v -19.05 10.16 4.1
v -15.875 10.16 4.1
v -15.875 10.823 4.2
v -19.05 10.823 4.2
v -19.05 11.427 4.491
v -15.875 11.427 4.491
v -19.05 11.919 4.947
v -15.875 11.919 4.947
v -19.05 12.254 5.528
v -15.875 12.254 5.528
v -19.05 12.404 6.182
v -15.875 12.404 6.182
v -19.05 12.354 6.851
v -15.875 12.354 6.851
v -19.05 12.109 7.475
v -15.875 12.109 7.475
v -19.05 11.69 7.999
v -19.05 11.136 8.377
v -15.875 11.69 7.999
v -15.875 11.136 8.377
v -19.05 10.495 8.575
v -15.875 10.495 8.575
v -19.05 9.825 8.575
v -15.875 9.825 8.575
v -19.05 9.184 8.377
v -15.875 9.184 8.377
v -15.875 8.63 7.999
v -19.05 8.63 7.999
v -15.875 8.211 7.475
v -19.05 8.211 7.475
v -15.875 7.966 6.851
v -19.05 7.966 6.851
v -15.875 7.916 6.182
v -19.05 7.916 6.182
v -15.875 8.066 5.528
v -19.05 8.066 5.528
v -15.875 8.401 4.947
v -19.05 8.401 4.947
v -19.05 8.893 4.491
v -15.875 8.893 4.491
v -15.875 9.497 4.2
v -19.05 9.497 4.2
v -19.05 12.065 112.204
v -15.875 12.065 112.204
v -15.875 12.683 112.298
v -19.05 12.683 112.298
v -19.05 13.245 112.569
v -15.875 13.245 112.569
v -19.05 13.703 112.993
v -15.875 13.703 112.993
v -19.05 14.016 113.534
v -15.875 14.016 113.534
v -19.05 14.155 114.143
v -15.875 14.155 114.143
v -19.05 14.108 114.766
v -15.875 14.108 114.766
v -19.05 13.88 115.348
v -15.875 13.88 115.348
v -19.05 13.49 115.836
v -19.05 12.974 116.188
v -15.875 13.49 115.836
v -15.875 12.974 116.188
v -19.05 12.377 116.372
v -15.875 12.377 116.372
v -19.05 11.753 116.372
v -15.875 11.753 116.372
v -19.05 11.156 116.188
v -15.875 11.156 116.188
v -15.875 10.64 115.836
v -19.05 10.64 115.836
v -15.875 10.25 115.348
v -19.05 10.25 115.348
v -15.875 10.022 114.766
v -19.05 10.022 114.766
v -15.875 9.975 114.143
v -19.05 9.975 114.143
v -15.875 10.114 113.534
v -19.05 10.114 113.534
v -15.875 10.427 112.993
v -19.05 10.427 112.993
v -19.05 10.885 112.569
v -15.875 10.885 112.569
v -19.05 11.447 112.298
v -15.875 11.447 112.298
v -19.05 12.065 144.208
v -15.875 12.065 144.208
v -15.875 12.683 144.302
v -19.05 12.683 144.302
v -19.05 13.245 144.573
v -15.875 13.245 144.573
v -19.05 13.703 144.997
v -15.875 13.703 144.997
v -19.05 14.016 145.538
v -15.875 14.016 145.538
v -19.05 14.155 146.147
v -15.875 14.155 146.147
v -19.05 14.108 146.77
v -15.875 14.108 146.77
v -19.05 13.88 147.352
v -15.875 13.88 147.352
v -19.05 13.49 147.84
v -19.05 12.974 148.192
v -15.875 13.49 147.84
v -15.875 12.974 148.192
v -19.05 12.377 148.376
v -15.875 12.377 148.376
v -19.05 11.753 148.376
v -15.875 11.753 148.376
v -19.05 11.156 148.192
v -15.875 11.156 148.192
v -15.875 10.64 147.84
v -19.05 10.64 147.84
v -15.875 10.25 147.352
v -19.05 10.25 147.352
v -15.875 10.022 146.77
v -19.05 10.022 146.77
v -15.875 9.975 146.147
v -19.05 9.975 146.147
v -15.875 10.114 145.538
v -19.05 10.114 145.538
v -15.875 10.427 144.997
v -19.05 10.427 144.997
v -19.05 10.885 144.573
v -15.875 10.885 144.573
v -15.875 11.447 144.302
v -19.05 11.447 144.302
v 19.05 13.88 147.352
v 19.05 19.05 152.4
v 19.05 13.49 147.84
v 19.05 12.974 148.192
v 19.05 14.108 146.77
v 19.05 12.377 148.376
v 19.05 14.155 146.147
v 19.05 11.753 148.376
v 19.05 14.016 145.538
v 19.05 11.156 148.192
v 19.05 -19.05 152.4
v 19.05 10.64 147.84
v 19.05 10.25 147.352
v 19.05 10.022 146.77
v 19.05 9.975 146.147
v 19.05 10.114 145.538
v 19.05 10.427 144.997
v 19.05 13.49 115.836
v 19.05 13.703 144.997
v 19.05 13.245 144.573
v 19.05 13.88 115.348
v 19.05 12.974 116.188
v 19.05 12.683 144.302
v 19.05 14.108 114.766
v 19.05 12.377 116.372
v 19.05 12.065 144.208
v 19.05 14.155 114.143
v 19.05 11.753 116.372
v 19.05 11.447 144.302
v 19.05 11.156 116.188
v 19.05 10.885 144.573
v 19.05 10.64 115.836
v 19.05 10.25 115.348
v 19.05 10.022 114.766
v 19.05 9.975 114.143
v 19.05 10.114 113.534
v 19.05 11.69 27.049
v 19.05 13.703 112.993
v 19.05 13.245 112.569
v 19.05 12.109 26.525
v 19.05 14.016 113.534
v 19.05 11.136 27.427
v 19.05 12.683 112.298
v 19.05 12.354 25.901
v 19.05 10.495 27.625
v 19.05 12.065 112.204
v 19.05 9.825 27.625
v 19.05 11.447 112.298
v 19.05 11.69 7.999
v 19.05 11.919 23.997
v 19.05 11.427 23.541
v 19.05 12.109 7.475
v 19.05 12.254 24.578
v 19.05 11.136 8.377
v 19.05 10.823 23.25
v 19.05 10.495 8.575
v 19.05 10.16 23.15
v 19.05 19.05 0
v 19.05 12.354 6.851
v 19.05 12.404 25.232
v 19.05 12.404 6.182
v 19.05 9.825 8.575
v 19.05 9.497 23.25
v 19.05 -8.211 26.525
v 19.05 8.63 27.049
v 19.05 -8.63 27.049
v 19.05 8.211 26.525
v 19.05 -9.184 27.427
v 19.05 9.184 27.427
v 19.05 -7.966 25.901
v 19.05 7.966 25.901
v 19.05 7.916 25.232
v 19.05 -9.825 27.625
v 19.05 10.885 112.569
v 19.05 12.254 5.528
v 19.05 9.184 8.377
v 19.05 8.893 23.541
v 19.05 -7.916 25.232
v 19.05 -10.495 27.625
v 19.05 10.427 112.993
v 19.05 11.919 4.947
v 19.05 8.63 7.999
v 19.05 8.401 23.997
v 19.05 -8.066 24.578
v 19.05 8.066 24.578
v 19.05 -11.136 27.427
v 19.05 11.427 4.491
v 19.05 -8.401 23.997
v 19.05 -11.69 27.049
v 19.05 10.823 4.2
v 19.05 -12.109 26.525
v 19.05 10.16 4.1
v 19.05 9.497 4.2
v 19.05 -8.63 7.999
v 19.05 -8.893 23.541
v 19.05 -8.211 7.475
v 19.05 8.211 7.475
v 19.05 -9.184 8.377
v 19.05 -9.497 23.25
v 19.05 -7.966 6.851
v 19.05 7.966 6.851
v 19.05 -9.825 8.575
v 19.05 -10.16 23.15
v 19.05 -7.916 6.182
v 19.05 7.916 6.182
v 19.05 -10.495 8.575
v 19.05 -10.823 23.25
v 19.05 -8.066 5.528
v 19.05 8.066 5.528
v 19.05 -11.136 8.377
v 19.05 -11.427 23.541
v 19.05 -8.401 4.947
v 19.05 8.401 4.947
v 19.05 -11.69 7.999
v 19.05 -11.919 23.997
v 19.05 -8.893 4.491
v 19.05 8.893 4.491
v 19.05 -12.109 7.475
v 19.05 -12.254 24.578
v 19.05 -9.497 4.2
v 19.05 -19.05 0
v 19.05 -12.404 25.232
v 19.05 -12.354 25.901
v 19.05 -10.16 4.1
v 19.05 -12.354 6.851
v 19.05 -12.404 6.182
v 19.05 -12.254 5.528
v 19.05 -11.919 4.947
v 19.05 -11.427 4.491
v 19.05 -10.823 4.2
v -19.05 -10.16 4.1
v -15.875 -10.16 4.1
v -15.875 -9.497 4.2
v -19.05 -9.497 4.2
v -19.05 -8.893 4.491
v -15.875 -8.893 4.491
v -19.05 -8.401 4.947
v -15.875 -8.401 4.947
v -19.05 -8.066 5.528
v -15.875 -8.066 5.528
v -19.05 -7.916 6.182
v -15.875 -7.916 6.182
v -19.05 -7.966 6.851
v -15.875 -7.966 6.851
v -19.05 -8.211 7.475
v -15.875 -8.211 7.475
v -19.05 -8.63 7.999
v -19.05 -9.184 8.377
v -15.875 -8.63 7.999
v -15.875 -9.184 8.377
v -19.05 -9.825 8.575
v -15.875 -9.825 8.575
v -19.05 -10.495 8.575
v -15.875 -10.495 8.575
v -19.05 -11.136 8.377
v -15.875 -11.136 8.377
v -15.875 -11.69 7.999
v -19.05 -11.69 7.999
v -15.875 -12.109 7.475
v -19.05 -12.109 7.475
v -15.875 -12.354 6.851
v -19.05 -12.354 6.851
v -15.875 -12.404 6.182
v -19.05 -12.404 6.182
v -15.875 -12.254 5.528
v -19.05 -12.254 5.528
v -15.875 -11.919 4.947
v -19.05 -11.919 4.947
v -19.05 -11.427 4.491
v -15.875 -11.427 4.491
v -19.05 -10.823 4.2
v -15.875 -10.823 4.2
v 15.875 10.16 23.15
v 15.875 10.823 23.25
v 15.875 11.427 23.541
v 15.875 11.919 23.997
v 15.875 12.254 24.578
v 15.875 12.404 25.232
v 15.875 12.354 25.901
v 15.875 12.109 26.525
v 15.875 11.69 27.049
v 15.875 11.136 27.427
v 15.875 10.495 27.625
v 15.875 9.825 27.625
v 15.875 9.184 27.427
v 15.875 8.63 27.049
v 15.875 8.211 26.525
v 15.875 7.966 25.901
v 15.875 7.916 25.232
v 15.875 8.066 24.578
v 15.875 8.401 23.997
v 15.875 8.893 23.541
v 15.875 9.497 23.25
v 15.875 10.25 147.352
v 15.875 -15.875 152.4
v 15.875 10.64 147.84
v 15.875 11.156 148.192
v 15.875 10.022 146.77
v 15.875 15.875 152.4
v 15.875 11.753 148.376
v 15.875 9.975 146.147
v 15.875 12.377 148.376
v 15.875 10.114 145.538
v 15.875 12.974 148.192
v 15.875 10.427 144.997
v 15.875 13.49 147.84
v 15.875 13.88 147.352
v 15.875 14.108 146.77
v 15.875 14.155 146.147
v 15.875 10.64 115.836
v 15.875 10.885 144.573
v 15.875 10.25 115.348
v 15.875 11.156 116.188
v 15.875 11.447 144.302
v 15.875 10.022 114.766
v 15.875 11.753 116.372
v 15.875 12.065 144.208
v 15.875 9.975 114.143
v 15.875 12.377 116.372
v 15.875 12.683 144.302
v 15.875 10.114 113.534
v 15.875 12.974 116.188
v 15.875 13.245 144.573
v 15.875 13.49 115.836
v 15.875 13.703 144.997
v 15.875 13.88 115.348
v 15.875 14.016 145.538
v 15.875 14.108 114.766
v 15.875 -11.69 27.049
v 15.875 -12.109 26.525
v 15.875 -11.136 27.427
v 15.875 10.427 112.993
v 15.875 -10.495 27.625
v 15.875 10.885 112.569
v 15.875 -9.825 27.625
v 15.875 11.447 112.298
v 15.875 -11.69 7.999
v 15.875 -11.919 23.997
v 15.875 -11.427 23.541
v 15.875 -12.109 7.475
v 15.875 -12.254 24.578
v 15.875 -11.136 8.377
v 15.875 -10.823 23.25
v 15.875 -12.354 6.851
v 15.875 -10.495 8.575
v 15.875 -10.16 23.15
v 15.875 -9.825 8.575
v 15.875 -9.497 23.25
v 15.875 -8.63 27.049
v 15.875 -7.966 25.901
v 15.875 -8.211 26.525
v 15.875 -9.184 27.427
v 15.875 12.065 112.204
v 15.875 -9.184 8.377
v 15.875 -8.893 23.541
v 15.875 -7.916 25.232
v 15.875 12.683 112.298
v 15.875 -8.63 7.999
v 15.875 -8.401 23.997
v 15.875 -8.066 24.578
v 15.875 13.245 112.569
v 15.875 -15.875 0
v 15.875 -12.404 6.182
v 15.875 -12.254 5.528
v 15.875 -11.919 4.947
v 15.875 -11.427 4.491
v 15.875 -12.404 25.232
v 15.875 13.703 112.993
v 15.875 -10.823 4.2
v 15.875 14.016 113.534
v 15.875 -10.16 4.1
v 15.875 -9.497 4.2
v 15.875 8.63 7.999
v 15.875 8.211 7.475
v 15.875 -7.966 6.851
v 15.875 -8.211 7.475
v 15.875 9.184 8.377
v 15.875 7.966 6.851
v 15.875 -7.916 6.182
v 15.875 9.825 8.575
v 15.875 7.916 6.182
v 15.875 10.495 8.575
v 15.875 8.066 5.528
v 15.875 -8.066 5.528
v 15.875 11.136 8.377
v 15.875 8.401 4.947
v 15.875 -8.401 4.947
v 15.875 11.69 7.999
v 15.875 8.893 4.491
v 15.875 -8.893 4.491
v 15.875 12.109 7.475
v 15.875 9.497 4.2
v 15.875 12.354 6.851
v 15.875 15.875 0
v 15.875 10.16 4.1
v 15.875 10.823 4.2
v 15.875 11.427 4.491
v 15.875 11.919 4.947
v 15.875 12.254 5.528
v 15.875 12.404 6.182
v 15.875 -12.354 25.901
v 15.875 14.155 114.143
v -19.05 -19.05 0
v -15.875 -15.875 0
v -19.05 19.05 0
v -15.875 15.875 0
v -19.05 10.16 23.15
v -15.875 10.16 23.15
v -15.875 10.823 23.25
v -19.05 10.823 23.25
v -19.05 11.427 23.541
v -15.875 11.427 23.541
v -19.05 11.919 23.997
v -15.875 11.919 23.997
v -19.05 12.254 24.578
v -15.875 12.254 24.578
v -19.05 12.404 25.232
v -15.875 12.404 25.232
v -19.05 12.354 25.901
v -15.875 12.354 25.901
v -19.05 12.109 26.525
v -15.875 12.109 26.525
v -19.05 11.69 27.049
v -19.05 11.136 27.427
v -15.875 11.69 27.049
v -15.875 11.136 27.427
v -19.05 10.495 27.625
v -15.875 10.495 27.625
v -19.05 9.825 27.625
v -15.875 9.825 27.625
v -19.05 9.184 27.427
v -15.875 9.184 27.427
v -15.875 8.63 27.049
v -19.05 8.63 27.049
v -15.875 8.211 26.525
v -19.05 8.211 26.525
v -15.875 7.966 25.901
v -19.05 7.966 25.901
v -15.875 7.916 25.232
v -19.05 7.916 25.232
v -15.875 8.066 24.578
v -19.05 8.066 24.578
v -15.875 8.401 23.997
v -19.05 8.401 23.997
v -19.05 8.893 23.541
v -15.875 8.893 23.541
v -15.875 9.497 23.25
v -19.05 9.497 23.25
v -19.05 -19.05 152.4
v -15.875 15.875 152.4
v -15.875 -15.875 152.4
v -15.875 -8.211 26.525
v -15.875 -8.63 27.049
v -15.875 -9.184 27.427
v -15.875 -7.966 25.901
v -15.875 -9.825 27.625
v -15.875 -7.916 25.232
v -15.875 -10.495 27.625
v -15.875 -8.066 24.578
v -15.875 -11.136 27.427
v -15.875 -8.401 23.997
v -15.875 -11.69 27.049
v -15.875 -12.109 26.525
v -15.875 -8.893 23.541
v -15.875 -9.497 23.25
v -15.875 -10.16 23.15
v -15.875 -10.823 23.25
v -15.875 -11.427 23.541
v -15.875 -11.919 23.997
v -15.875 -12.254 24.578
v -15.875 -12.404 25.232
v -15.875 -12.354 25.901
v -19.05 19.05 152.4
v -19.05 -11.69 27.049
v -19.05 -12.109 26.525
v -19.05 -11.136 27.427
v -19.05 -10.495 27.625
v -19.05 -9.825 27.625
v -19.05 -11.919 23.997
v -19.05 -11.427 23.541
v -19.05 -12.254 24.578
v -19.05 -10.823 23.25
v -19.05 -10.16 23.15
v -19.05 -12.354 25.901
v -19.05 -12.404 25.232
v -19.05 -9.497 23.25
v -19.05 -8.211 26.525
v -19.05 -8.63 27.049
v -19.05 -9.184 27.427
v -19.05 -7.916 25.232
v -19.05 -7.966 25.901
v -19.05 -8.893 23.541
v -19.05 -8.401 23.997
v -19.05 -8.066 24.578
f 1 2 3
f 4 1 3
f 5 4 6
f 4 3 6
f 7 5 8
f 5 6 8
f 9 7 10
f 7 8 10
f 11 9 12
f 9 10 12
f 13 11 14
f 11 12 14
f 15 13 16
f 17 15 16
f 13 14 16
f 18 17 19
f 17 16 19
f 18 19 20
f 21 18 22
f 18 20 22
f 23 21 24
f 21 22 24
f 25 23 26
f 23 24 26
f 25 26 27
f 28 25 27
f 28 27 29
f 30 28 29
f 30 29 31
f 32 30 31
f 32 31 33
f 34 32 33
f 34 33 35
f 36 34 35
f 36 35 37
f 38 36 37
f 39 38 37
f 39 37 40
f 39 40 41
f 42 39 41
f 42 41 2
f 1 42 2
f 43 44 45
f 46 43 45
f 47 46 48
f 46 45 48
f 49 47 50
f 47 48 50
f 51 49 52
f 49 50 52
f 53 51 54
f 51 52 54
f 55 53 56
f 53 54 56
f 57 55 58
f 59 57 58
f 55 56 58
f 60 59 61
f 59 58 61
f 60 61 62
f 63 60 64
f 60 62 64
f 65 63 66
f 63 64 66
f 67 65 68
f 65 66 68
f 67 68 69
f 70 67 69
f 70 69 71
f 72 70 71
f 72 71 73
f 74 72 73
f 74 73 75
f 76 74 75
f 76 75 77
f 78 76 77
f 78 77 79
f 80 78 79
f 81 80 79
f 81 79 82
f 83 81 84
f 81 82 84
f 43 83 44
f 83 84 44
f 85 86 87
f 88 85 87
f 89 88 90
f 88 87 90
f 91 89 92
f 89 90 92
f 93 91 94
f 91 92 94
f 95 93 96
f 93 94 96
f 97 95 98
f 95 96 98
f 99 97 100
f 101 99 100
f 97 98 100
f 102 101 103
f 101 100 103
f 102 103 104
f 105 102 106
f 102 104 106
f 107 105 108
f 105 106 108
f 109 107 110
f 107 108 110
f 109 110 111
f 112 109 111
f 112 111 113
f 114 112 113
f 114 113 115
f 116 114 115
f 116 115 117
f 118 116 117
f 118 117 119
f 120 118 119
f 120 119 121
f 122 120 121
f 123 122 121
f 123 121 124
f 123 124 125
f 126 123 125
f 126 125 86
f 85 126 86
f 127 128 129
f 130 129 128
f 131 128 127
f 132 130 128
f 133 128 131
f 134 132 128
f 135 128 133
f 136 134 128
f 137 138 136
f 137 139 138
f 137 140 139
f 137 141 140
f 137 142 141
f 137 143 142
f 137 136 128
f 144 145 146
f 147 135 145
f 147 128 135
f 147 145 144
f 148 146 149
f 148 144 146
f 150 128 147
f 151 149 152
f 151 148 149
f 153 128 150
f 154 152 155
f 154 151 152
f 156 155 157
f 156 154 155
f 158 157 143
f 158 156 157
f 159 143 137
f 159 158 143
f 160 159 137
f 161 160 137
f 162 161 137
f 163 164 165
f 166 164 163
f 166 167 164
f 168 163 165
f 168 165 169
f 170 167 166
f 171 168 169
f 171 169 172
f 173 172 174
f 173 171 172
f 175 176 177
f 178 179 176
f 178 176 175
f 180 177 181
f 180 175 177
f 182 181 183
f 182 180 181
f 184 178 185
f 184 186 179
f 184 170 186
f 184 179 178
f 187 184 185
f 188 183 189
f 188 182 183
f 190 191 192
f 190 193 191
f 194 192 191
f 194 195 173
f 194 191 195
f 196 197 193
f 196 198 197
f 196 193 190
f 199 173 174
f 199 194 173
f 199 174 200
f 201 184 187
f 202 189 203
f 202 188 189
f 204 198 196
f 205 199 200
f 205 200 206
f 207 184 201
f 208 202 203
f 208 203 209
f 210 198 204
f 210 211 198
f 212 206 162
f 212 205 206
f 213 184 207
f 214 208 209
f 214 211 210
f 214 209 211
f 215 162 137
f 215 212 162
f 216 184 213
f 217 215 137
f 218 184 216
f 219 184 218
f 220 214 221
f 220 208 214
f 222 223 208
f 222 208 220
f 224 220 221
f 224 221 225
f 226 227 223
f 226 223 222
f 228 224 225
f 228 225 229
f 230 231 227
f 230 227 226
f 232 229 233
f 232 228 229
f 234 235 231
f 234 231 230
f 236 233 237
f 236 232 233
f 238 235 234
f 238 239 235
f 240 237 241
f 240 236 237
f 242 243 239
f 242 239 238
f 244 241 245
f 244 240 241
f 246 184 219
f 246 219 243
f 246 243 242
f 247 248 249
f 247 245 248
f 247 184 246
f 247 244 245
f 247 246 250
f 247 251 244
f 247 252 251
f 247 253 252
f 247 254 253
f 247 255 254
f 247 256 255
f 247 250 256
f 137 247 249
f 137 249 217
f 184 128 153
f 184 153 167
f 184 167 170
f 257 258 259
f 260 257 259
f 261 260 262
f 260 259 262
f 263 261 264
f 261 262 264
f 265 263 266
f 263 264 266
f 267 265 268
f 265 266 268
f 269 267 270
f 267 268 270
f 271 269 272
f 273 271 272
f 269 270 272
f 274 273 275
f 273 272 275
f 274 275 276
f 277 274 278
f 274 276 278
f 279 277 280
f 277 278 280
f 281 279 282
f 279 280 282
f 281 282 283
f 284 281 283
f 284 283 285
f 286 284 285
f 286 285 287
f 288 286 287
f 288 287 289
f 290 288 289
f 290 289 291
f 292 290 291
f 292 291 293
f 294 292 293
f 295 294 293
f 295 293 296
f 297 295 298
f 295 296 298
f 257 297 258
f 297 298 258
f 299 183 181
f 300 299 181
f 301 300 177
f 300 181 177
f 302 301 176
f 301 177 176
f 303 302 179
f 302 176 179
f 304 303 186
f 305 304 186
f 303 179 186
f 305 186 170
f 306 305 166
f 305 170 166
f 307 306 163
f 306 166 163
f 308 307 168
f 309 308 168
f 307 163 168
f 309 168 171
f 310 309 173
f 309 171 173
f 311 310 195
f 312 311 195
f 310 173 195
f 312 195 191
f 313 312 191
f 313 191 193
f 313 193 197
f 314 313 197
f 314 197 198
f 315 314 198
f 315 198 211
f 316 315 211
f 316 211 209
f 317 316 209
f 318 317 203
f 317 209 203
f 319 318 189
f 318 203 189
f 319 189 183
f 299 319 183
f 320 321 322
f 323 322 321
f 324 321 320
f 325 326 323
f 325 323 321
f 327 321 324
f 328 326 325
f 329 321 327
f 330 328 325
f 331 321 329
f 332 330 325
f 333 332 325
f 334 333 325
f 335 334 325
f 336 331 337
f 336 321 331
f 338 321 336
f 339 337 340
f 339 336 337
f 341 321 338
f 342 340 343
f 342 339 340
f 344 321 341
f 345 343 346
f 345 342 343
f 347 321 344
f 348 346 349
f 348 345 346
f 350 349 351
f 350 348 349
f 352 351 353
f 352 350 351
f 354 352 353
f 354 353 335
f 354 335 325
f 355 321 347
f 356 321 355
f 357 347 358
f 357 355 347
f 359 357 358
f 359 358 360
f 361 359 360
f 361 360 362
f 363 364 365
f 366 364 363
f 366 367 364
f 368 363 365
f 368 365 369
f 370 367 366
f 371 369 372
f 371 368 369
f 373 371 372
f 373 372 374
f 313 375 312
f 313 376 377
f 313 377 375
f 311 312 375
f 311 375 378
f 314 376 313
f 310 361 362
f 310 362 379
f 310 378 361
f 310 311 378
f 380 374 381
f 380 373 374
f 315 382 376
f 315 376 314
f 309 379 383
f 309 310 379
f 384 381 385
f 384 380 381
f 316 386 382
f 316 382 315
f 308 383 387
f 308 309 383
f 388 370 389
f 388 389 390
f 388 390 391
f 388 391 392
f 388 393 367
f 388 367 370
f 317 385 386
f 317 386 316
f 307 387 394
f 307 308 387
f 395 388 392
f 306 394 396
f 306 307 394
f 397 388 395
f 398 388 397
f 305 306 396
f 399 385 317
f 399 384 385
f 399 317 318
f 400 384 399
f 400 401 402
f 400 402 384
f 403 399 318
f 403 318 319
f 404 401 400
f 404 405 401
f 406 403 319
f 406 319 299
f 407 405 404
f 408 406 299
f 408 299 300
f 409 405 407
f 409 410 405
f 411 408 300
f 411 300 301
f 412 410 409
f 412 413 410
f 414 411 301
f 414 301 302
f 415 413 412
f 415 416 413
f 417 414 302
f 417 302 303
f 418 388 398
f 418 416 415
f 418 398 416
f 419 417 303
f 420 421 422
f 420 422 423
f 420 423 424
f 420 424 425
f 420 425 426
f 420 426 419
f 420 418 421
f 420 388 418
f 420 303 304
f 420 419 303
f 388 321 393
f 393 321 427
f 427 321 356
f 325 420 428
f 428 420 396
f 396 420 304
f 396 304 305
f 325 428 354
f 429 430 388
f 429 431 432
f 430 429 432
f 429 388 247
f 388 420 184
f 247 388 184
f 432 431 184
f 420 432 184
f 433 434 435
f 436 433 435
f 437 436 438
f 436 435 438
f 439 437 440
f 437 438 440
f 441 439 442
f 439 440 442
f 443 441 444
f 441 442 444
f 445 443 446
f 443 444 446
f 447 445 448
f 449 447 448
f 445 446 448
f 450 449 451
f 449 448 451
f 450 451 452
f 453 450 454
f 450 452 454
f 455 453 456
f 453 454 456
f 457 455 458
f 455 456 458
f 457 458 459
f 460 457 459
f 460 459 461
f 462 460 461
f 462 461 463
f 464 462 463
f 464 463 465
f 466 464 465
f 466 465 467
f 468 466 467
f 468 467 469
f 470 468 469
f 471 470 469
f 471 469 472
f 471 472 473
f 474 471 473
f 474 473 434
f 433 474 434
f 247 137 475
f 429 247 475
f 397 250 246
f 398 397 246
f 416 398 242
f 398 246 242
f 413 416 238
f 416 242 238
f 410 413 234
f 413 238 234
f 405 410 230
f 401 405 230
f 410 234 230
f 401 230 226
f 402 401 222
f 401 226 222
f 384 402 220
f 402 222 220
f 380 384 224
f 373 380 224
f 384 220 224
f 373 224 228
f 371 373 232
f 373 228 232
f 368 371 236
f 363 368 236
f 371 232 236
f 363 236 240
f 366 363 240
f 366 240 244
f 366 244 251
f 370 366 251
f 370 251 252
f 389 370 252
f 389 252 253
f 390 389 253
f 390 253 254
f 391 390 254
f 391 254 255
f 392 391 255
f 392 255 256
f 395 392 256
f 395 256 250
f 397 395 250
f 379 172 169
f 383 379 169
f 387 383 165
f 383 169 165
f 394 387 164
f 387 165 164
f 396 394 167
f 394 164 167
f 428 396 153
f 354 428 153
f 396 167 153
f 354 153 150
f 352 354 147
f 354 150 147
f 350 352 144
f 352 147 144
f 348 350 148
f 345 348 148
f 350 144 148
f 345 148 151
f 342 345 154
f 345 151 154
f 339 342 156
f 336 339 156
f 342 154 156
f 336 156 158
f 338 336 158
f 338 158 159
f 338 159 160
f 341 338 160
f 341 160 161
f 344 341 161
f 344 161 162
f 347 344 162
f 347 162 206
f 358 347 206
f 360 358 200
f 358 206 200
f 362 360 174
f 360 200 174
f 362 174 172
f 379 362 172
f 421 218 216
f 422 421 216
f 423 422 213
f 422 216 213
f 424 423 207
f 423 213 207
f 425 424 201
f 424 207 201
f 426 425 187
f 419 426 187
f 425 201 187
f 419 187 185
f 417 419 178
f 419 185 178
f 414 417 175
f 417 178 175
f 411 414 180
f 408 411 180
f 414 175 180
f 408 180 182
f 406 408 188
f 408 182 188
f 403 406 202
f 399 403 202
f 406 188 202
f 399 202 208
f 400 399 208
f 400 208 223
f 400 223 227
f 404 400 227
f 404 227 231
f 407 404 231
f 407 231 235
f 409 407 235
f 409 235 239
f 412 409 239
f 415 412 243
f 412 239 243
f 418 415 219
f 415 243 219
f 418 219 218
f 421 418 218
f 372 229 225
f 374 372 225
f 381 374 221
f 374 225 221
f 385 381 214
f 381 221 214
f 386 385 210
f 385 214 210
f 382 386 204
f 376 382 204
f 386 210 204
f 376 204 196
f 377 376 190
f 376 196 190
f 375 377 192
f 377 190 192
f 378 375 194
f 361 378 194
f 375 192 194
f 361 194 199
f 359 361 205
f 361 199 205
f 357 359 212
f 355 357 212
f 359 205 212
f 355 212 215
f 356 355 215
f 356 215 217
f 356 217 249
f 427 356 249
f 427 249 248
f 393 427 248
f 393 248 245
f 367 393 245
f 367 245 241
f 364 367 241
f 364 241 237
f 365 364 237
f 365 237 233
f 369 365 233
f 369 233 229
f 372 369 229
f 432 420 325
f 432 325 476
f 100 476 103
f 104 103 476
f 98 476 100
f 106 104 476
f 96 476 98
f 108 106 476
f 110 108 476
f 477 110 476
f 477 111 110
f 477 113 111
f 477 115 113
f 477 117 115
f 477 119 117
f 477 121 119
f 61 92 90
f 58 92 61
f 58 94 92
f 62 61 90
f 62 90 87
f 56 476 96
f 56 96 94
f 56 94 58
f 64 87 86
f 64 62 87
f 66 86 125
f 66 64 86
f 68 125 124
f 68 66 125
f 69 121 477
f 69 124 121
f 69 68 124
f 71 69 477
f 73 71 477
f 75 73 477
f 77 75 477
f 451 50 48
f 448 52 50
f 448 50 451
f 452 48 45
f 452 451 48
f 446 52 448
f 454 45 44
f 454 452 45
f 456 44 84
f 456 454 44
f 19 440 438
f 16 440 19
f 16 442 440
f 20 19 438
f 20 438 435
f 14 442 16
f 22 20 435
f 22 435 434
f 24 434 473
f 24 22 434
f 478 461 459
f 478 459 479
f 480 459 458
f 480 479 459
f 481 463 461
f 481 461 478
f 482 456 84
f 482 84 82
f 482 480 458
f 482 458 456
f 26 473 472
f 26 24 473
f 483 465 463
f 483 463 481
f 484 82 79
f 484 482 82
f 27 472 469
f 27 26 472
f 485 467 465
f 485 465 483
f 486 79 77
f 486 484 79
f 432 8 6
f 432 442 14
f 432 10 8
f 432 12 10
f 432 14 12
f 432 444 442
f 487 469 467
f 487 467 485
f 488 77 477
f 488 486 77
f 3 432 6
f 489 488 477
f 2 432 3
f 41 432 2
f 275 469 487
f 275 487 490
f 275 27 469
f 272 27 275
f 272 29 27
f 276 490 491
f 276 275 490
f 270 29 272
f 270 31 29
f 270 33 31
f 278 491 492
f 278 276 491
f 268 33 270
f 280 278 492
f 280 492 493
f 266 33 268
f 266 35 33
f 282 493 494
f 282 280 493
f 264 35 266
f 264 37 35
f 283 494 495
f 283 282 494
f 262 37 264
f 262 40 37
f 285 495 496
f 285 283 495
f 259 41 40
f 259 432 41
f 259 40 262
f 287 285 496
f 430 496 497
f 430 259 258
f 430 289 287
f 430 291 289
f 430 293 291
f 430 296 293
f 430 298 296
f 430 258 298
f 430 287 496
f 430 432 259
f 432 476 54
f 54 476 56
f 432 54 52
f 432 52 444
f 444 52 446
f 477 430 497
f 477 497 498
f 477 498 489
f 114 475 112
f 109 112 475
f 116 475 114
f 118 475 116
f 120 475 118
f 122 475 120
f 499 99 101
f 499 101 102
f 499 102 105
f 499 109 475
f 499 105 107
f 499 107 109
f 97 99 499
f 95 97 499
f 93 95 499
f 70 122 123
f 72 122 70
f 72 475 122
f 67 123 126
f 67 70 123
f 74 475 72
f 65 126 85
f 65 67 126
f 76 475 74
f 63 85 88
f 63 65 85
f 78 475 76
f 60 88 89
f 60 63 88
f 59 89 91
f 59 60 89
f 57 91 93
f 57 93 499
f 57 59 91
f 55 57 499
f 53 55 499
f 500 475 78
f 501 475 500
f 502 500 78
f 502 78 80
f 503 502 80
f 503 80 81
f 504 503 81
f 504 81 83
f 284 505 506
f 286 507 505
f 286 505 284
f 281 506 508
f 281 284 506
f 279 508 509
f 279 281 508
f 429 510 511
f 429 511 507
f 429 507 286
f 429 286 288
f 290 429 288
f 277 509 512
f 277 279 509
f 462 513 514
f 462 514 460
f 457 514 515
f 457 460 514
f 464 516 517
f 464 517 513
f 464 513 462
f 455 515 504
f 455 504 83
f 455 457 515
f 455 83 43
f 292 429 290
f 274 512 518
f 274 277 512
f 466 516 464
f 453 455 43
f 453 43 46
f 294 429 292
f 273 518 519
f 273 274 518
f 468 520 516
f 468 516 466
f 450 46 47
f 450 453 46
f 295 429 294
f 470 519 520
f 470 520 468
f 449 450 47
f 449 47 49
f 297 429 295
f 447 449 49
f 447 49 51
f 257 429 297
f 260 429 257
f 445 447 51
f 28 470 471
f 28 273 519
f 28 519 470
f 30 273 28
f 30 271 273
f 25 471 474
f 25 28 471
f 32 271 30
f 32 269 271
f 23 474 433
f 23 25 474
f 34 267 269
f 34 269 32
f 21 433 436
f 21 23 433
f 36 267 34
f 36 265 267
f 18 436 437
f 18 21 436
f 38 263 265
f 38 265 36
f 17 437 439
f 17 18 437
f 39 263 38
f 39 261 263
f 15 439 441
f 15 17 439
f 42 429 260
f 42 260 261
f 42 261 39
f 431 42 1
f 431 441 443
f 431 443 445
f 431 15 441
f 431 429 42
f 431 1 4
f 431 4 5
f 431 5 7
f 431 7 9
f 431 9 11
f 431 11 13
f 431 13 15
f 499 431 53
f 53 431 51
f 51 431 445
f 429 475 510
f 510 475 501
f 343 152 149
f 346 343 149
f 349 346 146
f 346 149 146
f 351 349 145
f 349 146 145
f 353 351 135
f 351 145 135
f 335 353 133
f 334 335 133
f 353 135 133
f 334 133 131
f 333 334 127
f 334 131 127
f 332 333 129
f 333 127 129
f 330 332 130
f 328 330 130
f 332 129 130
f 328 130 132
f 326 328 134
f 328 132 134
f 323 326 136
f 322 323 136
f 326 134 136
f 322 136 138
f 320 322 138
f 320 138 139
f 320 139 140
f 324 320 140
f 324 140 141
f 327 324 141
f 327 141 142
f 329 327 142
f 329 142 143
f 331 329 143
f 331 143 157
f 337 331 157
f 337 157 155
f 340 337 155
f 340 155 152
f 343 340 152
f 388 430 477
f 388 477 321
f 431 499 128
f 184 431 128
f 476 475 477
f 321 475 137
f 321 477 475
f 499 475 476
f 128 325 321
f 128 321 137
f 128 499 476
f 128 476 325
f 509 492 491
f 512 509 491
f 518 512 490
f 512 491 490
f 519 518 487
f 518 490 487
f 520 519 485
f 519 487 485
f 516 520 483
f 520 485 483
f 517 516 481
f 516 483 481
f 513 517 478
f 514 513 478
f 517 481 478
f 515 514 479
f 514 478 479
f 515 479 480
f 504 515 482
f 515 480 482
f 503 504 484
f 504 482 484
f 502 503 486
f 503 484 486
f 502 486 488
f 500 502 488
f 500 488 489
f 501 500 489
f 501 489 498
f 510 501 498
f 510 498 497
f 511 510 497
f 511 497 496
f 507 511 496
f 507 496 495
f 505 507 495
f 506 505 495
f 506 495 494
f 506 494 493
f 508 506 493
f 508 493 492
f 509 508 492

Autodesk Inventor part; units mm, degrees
ref_plane "YZ Plane" through (0, 0, 0) normal (1, 0, 0) x (0, 1, 0)
ref_plane "XZ Plane" through (0, 0, 0) normal (0, 1, 0) x (-1, 0, 0)
ref_plane "XY Plane" through (0, 0, 0) normal (0, 0, 1) x (1, 0, 0)
sketch "Sketch1" plane through (0, 0, 0) normal (0, 0, 1) x (1, 0, 0)
  line L0 (19.05, -19.05) -> (-19.05, -19.05)
  line L1 (-19.05, -19.05) -> (-19.05, 19.05)
  line L2 (-19.05, 19.05) -> (19.05, 19.05)
  line L3 (19.05, 19.05) -> (19.05, -19.05)
  line L4 (19.05, -19.05) -> (-19.05, 19.05) construction
  line L5 (-19.05, -19.05) -> (19.05, 19.05) construction
  line L6 (15.875, 15.875) -> (-15.875, 15.875)
  line L7 (-15.875, 15.875) -> (-15.875, -15.875)
  line L8 (-15.875, -15.875) -> (15.875, -15.875)
  line L9 (15.875, -15.875) -> (15.875, 15.875)
  point P0 (0, 0)
  dimension "d0" = 38.1
  dimension "d1" = 38.1
  dimension "d2" = 3.175
extrude "Extrusion1" add sketch "Sketch1" along normal blind 152.4
sketch "Sketch2" plane through (19.05, -19.05, 0) normal (1, 0, 0) x (0, 0, -1)
  line L0 (0, 0) -> (0, 38.1) projected
  line L1 (0, 38.1) -> (-152.4, 38.1) projected
  line L2 (-152.4, 0) -> (-152.4, 38.1) projected
  line L3 (0, 0) -> (-152.4, 0) projected
  line L4 (-76.2, 38.1) -> (-76.2, 0) construction
  line L5 (-152.4, 19.05) -> (0, 19.05) construction
  circle A0 centre (-114.3, 31.115) radius 2.0955
  circle A1 centre (-146.304, 31.115) radius 2.0955
  dimension "d5" = 4.191
  dimension "d7" = 114.3
  dimension "d8" = 4.191
  dimension "d9" = 6.985
  dimension "d10" = 6.985
  dimension "d11" = 32.004
extrude "Extrusion2" cut sketch "Sketch2" against normal through all contours A0 | A1
sketch "Sketch3" plane through (19.05, -19.05, 0) normal (1, 0, 0) x (0, 0, -1)
  line L0 (0, 38.1) -> (-152.4, 38.1) construction
  line L1 (-76.2, 38.1) -> (-76.2, 0) construction
  line L2 (0, 0) -> (-152.4, 0) construction
  line L3 (0, 19.05) -> (-152.4, 19.05) construction
  line L4 (-152.4, 38.1) -> (-152.4, 0) construction
  circle A0 centre (-6.35, 29.21) radius 2.25
  line L5 (0, 0) -> (0, 38.1) projected
  circle A1 centre (-6.35, 8.89) radius 2.25
  circle A2 centre (-25.4, 29.21) radius 2.25
  circle A3 centre (-25.4, 8.89) radius 2.25
  dimension "d14" = 4.5
  dimension "d15" = 6.35
  dimension "d16" = 4.5
  dimension "d17" = 6.35
  dimension "d18" = 8.89
  dimension "d19" = 8.89
  dimension "d20" = 4.5
  dimension "d21" = 19.05
  dimension "d22" = 4.5
extrude "Extrusion3" cut sketch "Sketch3" against normal through all
properties part number "CS_Climb_Outer_Tube"
